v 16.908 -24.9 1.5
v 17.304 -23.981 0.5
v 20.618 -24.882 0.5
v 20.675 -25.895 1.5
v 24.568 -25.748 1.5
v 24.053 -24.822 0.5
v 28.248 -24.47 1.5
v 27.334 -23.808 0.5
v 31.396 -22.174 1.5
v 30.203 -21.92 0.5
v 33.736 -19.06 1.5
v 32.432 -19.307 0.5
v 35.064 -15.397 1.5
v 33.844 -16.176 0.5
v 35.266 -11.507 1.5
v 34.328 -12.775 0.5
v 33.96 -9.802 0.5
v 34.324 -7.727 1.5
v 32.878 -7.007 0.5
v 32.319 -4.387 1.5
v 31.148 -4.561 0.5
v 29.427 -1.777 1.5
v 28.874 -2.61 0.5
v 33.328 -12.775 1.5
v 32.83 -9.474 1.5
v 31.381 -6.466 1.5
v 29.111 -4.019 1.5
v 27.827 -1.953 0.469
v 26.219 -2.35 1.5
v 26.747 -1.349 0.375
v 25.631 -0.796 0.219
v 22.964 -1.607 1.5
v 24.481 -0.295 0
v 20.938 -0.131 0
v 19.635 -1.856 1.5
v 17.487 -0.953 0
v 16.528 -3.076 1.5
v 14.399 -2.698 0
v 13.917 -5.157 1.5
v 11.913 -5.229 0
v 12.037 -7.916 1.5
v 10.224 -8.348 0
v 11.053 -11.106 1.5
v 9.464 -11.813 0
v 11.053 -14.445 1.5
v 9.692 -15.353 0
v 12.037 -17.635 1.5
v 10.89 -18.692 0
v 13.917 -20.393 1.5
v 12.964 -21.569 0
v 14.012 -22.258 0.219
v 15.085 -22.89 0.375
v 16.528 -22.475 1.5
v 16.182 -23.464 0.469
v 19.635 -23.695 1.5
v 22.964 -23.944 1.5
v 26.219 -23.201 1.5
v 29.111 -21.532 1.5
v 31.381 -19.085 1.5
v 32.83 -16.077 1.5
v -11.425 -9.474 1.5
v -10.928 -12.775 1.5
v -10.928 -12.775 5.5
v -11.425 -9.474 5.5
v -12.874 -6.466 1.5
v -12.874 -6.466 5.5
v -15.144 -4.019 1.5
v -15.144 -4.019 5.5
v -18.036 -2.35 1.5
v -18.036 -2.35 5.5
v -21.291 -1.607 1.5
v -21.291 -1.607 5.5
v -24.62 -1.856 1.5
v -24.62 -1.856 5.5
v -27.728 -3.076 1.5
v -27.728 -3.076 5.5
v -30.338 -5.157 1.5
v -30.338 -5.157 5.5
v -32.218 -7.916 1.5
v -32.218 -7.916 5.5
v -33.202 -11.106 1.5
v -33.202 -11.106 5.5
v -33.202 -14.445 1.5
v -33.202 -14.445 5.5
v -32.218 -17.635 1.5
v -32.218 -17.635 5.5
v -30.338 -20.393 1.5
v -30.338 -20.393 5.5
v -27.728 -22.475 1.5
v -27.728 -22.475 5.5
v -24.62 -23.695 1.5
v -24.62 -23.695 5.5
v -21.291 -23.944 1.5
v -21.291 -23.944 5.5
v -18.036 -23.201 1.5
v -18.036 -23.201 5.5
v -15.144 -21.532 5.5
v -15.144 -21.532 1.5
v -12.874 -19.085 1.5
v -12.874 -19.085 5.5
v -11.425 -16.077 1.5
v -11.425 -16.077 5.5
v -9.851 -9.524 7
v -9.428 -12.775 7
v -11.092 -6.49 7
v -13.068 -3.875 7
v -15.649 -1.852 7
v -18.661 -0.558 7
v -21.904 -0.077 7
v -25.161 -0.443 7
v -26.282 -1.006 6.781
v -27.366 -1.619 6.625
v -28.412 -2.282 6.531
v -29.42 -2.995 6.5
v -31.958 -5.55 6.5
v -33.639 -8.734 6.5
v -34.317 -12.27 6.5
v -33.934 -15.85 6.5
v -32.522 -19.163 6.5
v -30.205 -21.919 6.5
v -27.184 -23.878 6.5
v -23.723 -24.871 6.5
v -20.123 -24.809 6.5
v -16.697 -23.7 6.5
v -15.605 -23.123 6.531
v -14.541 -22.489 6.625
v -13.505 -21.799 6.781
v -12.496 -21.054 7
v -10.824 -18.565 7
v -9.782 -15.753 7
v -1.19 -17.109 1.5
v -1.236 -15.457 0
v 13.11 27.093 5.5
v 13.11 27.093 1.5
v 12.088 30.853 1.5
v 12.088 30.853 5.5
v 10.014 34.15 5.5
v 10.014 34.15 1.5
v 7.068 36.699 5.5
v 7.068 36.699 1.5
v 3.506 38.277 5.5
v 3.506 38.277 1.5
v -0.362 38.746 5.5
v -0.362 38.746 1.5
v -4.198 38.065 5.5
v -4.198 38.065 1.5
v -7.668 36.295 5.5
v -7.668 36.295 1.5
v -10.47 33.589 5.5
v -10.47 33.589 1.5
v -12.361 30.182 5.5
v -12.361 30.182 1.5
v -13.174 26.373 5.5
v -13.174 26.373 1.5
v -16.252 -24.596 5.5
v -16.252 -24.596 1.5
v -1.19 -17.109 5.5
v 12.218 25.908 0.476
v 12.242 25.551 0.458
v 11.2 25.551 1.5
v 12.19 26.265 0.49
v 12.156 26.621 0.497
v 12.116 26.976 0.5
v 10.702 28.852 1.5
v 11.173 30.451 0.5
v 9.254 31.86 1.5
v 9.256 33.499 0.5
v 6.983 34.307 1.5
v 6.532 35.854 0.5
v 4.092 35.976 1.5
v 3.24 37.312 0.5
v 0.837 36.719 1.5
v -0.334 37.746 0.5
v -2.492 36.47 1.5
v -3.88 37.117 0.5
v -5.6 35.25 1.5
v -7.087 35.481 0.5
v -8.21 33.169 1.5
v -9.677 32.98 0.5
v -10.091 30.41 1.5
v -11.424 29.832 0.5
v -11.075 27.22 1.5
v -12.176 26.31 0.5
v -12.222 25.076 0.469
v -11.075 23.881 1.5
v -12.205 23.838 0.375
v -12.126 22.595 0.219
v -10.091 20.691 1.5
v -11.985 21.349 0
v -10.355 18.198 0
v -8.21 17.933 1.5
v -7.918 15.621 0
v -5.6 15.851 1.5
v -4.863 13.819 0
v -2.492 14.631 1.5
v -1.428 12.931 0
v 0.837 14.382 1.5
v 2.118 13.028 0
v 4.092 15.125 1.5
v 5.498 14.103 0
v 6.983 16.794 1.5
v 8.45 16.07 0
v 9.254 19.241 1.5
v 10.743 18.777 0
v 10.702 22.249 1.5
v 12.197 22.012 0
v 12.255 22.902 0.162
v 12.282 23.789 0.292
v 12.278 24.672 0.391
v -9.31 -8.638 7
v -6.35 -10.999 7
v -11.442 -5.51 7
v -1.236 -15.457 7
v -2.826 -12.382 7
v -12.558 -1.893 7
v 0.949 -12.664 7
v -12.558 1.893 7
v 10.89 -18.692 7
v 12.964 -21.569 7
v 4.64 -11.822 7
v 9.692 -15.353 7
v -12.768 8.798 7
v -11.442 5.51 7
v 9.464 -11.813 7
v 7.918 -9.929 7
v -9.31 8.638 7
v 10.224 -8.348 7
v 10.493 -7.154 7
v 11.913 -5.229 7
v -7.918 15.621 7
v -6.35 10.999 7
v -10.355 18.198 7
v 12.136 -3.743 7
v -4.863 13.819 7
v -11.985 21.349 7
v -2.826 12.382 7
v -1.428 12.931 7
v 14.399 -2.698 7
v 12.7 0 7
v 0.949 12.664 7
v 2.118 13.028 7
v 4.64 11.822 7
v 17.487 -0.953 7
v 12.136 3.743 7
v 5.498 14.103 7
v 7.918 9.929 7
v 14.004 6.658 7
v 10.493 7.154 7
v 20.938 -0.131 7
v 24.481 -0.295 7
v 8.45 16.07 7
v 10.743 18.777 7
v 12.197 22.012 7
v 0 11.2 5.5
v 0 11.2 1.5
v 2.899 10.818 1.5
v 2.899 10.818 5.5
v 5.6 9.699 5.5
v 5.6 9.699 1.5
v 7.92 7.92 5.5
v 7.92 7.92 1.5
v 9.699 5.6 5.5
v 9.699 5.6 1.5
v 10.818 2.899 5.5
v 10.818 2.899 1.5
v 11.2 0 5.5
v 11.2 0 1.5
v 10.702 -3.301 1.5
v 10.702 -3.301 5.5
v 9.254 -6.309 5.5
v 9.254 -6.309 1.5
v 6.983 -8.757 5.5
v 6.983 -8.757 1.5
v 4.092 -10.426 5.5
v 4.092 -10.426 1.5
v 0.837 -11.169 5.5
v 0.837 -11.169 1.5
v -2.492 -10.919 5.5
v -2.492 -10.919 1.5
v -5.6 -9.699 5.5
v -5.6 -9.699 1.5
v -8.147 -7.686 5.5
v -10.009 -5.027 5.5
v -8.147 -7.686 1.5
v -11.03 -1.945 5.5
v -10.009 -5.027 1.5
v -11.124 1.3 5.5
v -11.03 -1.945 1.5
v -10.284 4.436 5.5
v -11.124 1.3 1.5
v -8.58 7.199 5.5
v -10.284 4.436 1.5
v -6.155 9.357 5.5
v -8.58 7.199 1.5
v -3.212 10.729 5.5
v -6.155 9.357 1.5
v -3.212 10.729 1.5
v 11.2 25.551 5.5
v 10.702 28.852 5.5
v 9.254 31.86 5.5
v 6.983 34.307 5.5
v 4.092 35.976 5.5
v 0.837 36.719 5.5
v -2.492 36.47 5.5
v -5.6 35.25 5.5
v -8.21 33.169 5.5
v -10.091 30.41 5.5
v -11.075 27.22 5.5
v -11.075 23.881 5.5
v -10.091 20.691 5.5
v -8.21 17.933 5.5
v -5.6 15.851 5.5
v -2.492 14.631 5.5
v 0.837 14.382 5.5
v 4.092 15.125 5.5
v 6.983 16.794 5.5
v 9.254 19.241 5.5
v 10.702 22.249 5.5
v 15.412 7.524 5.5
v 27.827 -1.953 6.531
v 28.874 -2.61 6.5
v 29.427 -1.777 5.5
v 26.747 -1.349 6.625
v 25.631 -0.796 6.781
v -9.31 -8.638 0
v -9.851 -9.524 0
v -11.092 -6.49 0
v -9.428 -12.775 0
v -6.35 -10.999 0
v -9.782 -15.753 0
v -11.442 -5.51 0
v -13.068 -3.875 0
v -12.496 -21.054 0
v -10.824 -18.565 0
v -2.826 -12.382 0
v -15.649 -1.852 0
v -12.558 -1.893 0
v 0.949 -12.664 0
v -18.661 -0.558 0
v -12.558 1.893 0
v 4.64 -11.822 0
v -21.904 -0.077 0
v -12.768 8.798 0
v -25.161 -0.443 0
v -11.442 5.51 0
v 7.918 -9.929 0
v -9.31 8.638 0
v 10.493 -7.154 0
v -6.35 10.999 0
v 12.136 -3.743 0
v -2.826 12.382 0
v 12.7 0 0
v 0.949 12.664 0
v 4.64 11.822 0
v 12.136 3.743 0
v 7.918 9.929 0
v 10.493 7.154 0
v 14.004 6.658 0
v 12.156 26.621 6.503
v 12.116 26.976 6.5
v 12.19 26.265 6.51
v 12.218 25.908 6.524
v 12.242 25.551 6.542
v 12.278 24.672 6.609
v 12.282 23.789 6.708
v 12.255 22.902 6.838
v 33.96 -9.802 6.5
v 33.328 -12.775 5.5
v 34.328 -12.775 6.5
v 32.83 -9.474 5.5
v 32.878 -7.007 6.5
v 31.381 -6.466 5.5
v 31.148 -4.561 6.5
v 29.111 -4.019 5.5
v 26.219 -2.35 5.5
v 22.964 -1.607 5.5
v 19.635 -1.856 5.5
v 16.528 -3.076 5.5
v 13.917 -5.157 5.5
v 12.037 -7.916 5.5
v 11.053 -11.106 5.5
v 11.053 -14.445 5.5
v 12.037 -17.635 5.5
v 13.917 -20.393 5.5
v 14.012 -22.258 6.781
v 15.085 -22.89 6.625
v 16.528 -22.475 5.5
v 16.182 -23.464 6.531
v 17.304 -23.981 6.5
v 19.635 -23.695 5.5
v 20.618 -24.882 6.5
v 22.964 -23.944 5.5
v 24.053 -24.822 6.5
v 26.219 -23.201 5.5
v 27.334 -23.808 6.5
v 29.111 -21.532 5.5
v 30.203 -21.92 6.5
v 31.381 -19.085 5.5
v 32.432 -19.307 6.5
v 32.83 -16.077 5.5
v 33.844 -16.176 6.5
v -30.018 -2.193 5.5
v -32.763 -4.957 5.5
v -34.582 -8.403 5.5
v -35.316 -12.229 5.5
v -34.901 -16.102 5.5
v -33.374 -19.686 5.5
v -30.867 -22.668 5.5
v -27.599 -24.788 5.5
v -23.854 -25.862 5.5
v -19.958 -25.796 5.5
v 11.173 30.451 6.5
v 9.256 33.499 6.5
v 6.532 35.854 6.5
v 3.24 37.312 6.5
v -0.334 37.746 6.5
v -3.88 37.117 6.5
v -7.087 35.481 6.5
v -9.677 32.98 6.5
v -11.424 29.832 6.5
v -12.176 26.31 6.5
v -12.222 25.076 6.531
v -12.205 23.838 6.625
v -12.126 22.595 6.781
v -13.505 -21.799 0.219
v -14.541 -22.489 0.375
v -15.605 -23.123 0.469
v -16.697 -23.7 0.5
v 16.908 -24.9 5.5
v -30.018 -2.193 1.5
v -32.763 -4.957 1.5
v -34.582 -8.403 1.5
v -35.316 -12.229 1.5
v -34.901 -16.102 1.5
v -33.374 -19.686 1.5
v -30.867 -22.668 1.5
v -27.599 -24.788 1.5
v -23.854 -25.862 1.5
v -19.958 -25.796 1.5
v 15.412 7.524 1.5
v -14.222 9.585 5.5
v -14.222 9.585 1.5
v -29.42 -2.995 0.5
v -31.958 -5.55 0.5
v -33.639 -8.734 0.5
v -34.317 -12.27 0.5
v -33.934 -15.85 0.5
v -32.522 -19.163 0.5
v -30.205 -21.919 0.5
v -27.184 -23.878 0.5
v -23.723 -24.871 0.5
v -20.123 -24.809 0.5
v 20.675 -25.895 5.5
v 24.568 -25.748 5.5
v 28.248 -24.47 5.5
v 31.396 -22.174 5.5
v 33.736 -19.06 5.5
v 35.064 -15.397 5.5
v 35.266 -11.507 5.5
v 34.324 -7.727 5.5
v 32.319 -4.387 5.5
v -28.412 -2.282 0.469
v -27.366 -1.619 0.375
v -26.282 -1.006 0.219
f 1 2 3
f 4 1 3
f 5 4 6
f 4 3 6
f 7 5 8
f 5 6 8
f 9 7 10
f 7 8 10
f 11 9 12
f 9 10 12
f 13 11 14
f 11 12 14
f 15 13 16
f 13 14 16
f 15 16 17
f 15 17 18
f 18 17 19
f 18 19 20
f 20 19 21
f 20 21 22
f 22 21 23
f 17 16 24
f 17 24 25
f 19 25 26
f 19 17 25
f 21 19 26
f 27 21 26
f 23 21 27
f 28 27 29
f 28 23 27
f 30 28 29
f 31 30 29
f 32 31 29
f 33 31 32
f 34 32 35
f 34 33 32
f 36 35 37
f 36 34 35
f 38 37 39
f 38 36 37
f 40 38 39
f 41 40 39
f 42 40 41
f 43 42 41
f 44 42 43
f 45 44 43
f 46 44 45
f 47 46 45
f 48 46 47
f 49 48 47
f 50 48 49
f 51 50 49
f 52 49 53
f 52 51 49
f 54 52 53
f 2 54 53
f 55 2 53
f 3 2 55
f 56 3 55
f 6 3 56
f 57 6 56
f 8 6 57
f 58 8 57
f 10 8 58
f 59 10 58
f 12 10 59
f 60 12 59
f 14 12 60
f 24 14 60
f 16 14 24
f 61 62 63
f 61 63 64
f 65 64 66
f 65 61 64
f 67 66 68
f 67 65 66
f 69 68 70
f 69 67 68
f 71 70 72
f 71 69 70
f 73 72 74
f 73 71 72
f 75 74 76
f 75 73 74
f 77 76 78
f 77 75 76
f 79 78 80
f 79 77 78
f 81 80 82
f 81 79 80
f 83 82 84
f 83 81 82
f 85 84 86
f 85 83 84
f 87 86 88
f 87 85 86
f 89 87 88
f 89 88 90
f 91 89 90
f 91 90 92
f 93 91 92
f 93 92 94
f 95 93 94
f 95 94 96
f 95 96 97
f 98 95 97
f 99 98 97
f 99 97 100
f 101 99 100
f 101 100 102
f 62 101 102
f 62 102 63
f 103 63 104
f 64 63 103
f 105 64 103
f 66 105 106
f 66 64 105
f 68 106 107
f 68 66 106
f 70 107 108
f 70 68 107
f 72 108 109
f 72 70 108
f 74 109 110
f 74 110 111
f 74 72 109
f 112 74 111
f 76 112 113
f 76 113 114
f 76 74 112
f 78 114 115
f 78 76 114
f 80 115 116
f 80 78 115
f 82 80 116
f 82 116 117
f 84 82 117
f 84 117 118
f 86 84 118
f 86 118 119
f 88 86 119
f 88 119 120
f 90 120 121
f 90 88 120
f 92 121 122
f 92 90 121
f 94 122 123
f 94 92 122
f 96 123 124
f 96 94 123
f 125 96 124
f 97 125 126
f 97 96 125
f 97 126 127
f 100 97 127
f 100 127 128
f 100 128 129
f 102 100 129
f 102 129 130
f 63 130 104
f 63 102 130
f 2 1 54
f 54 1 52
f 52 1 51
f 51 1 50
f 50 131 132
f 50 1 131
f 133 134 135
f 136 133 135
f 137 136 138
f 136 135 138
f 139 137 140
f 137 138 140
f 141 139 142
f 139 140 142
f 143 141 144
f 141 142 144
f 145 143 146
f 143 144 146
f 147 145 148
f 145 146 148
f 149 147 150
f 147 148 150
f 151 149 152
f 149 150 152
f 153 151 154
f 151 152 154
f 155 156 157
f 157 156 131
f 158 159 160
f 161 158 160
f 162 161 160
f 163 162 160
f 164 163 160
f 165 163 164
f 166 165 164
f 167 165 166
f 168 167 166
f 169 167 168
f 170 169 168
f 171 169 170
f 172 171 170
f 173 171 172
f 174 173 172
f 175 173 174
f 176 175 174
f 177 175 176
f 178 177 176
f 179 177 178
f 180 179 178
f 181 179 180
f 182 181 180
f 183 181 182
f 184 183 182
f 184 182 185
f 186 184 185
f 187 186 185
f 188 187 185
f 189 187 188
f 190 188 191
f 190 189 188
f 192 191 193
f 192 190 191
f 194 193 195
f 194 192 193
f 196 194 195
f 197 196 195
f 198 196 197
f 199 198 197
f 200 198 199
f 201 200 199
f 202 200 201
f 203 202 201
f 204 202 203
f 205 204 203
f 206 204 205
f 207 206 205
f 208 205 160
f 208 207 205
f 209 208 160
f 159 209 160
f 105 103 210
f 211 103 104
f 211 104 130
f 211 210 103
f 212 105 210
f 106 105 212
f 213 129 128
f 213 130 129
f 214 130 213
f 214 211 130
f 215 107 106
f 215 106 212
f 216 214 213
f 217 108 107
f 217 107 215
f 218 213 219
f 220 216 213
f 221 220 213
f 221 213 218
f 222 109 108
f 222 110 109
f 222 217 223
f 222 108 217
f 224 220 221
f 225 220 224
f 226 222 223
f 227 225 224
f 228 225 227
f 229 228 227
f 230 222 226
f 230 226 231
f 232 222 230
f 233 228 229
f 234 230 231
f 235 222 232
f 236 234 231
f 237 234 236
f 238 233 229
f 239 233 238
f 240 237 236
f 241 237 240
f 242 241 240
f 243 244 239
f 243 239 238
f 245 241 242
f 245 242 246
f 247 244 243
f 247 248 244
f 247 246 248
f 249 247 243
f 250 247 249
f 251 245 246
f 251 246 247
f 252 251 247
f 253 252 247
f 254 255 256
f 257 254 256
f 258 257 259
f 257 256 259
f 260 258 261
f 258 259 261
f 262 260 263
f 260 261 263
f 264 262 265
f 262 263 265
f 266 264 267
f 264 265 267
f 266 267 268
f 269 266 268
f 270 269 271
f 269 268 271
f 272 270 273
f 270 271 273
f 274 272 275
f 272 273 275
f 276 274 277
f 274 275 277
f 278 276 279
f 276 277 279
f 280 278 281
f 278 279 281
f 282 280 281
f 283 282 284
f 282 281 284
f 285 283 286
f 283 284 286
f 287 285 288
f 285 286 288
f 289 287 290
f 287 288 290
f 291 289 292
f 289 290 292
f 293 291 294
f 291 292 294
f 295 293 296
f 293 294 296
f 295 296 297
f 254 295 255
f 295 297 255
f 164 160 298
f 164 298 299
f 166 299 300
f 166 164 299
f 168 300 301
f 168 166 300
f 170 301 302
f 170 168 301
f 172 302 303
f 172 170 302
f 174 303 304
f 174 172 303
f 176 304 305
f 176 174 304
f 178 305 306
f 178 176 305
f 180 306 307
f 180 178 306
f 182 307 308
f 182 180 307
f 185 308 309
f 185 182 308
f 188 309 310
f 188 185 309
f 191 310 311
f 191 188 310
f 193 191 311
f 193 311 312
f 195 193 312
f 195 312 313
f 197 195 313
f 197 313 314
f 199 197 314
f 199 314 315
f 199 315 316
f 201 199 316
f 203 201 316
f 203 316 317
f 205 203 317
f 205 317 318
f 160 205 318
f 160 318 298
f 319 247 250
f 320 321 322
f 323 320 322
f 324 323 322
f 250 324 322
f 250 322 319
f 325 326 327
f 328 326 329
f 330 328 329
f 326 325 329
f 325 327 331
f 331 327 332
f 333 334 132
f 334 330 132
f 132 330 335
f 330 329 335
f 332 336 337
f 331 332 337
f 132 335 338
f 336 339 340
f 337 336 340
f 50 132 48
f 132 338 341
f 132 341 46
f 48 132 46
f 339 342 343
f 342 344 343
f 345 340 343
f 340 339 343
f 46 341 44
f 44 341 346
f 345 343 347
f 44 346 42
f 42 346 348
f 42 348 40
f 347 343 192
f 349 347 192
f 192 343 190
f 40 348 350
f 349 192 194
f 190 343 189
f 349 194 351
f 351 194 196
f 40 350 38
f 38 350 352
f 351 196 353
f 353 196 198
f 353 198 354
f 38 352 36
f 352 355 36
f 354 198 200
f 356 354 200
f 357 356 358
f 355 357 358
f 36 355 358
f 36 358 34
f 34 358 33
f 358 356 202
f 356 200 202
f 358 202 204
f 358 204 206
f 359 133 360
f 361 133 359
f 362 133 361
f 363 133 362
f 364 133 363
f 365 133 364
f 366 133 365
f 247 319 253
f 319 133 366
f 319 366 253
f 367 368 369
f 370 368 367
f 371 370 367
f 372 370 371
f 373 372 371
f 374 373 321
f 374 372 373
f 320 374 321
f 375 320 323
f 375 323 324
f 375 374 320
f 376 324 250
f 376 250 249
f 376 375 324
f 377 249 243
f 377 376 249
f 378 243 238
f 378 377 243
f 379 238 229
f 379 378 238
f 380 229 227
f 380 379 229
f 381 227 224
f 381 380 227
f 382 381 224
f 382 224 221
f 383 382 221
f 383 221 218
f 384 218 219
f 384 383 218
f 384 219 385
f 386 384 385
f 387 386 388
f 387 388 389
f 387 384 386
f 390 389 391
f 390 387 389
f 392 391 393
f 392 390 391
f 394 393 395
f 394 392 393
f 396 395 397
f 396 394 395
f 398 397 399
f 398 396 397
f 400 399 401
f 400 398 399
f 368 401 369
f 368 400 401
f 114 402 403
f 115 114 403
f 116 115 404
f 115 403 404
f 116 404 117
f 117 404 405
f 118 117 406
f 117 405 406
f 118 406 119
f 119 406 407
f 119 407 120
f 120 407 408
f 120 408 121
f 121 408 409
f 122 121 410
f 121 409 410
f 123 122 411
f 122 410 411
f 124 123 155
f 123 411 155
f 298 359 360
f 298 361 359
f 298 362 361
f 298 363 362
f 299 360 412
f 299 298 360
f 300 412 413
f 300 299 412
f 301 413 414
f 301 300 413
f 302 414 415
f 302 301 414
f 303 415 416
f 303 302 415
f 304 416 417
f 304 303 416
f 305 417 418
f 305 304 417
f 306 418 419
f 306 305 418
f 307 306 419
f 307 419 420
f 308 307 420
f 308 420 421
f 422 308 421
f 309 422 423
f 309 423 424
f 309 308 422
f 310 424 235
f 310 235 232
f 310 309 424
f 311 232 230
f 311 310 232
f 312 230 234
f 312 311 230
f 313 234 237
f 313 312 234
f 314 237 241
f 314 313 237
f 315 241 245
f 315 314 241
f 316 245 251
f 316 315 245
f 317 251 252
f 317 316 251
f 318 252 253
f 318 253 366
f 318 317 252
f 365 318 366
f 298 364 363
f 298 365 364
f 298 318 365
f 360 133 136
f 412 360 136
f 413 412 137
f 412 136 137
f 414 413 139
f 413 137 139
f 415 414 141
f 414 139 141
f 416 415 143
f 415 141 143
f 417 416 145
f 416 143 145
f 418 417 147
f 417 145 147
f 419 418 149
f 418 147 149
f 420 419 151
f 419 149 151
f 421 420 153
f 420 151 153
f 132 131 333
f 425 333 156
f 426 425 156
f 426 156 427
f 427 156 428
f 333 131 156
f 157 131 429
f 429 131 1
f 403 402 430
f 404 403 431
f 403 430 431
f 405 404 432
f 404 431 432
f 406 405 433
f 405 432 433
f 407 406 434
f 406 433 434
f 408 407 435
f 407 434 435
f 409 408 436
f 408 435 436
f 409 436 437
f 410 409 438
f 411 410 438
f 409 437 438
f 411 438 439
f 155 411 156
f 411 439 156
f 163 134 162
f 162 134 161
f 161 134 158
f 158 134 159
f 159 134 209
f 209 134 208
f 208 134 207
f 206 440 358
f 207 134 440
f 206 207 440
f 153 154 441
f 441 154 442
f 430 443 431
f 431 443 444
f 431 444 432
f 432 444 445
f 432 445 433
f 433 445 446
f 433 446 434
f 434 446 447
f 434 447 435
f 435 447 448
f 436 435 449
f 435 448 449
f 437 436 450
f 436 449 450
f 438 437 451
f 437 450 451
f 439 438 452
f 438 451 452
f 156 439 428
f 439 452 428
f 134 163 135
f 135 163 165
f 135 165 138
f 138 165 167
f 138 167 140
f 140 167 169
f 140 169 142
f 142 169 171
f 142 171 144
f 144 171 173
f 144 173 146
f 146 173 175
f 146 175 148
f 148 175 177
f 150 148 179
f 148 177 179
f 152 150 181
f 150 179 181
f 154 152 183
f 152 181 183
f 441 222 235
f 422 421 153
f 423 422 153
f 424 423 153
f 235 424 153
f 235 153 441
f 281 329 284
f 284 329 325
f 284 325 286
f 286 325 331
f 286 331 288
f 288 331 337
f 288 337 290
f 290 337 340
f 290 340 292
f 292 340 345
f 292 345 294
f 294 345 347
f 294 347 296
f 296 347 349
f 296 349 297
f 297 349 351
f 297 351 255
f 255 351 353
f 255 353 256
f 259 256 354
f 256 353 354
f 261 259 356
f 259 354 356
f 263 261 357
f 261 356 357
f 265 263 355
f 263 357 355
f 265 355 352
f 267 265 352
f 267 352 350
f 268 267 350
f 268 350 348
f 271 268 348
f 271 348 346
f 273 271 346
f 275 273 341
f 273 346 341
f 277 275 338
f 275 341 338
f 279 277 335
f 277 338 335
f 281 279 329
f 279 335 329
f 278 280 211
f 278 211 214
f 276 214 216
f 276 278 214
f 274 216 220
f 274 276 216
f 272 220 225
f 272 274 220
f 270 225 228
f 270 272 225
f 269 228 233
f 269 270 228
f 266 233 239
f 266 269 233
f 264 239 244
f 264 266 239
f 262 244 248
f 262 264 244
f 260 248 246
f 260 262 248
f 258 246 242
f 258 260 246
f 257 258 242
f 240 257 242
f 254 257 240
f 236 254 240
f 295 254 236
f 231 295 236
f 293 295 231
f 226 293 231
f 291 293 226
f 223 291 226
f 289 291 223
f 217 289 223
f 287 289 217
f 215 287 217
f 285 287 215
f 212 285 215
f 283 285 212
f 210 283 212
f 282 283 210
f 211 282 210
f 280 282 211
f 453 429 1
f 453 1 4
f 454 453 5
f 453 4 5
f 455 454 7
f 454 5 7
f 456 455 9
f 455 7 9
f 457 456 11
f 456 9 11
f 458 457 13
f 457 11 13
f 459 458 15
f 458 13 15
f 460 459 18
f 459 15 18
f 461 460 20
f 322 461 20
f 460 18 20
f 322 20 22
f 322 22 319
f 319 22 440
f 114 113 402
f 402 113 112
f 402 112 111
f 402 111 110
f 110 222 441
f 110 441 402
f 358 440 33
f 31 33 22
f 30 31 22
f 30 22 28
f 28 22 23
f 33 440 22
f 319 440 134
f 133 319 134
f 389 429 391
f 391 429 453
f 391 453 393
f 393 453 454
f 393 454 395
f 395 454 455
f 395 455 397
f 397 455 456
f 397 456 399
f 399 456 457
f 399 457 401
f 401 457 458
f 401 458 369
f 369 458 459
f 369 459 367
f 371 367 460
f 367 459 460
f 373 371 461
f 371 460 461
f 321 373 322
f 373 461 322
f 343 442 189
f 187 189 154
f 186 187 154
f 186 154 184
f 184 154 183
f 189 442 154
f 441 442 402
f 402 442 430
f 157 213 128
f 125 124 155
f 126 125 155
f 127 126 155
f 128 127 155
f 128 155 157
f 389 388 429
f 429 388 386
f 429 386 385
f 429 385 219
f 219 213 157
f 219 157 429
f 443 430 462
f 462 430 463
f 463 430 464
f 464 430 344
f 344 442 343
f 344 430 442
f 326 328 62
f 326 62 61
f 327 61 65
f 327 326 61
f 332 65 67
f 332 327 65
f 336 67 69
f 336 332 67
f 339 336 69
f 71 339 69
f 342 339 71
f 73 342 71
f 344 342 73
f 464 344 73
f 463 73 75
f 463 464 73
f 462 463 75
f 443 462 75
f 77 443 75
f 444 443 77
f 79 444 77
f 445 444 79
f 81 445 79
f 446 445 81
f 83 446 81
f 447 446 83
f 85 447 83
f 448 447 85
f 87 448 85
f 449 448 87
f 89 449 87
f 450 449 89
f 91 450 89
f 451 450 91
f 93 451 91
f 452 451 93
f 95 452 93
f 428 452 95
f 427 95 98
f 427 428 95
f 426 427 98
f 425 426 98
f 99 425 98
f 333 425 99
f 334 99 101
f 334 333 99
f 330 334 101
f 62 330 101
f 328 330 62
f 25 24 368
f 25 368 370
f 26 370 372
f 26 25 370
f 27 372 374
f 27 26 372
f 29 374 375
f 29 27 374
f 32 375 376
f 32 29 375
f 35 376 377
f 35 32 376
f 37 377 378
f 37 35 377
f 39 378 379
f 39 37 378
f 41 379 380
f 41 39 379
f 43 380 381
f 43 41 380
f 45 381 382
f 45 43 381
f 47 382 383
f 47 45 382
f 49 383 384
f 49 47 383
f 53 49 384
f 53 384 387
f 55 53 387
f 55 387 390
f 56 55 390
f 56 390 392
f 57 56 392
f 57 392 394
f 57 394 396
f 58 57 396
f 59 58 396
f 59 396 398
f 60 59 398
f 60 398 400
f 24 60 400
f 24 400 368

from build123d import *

# Parameters (mm, degrees)
F0_R         = 11.2
F1_DEPTH     = 7
F2_T4_DEPTH  = 23.5617897445
F2_T7_ANGLE  = 169.7193644143
F2_T11_DEPTH = 20.6774904565
F2_T16_DEPTH = 23.5617897445
F2_T19_ANGLE = 169.7193644143
F2_T23_DEPTH = 20.6774904565
F2_T28_DEPTH = 23.5617897445
F2_T31_ANGLE = 169.7193644143
F2_T35_DEPTH = 20.6774904565
F2_T49_DEPTH = 23.5617897445
F2_T53_DEPTH = 20.6774904565
F2_T60_DEPTH = 20.6774904565
F2_T64_DEPTH = 23.5617897445
F2_T71_DEPTH = 20.6774904565
F2_T75_DEPTH = 23.5617897445
F3_T4_DEPTH  = 23.5617897445
F3_T7_ANGLE  = 169.7193644143
F3_T11_DEPTH = 20.6774904565
F3_T16_DEPTH = 23.5617897445
F3_T19_ANGLE = 169.7193644143
F3_T23_DEPTH = 20.6774904565
F3_T28_DEPTH = 23.5617897445
F3_T31_ANGLE = 169.7193644143
F3_T35_DEPTH = 20.6774904565
F3_T49_DEPTH = 23.5617897445
F3_T53_DEPTH = 20.6774904565
F3_T60_DEPTH = 23.5617897445
F3_T64_DEPTH = 20.6774904565
F3_T71_DEPTH = 23.5617897445
F3_T75_DEPTH = 20.6774904565


# Not quite as in the source:
# - a fillet or chamfer that OpenCascade refuses, or shapes differently, is made with other operations: its cross-section is extruded or revolved along the edge and cut away or added


with BuildPart() as f1:
    # F0 (on Top) → F1 (new body)
    with BuildSketch(Plane.XY):
        with BuildLine():
            Line((15.4120276741, 7.5237850523), (13.109573538, 27.0930664517))
            ThreePointArc((13.109573538, 27.0930664517), (-0.3616695295, 38.7456835975), (-13.1743812219, 26.3726364702))
            Line((-13.1743812219, 26.3726364702), (-14.221802825, 9.5853149634))
            Line((-14.221802825, 9.5853149634), (-30.0180705826, -2.1933095092))
            ThreePointArc((-30.0180705826, -2.1933095092), (-33.3739115177, -19.686056799), (-16.252182537, -24.5956670524))
            Line((-16.252182537, -24.5956670524), (-1.1902248491, -17.1091000158))
            Line((-1.1902248491, -17.1091000158), (16.9084970446, -24.8997569426))
            ThreePointArc((16.9084970446, -24.8997569426), (33.7355810471, -19.0596267984), (29.4265637589, -1.7769694177))
            Line((29.4265637589, -1.7769694177), (15.4120276741, 7.5237850523))
        make_face()
        with Locations((-22.1275026794, -12.7753196284)):
            Circle(F0_R, mode=Mode.SUBTRACT)
        with Locations((22.1275026794, -12.7753196284)):
            Circle(F0_R, mode=Mode.SUBTRACT)
        with BuildLine():
            ThreePointArc((0, 11.2), (7.9195959493, 7.9195959493), (11.2, 0))
            ThreePointArc((11.2, 0), (5.6, -9.6994845224), (-5.6, -9.6994845224))
            ThreePointArc((-5.6, -9.6994845224), (-10.8183692544, 2.8987733051), (0, 11.2))
        make_face(mode=Mode.SUBTRACT)
        with Locations((0, 25.5506392568)):
            Circle(F0_R, mode=Mode.SUBTRACT)
    extrude(amount=F1_DEPTH)

    # F2: chamfer of 1.5 on 13 edges, made by hand


with BuildPart() as f2_tool2:
    # F2_s3 → F2_t4 (new body)
    with BuildSketch(Plane(origin=(-0.211945286, 1.8013896037, 0), x_dir=(0, 0, 1), z_dir=(-0.1168505451, 0.9931495105, 0))):
        Polygon((5.5, 16.185606124), (7, 14.685606124), (7, 16.185606124), align=None)
    extrude(amount=F2_T4_DEPTH)

    split(bisect_by=Plane(origin=(8.1788758548, 12.3240701783, 0), x_dir=(0, 0, 1), z_dir=(0.5529591727, 0.8332083493, 0)), keep=Keep.TOP)


with BuildPart() as f1_1:
    add(f1.part)

    # F2_t1: cut F2_tool2
    add(f2_tool2.part, mode=Mode.SUBTRACT)

    # F2_s6 → F2_t7 (revolve, cut)
    with BuildSketch(Plane(origin=(-2.9651532605, 25.2017695539, 0), x_dir=(0, 0, 1), z_dir=(0.1168505451, -0.9931495105, 0))):
        Polygon((7, -14.685606124), (5.5, -16.185606124), (7, -16.185606124), align=None)
    revolve(axis=Axis((0, 25.5506392568, 7), (0, 0, 1)), revolution_arc=F2_T7_ANGLE, mode=Mode.SUBTRACT)


with BuildPart() as f2_tool9:
    # F2_s10 → F2_t11 (new body)
    with BuildSketch(Plane(origin=(1.5880145579, 25.4515572947, 0), x_dir=(0, 0, 1), z_dir=(-0.0622725162, -0.9980591835, 0))):
        Polygon((7, 13.2911025961), (5.5, 14.7911025961), (7, 14.7911025961), align=None)
    extrude(amount=F2_T11_DEPTH)

    split(bisect_by=Plane(origin=(-9.6752745589, 12.9754733174, 0), x_dir=(0, 0, 1), z_dir=(-0.5977702957, 0.8016674333, 0)), keep=Keep.TOP)


with BuildPart() as f1_2:
    add(f1_1.part)

    # F2_t8: cut F2_tool9
    add(f2_tool9.part, mode=Mode.SUBTRACT)


with BuildPart() as f2_tool14:
    # F2_s15 → F2_t16 (new body)
    with BuildSketch(Plane(origin=(-1.4540765159, -1.0842448037, 0), x_dir=(0, 0, 1), z_dir=(-0.8016674333, -0.5977702957, 0))):
        Polygon((7, 14.685606124), (5.5, 16.185606124), (7, 16.185606124), align=None)
    extrude(amount=F2_T16_DEPTH)

    split(bisect_by=Plane(origin=(-14.7623957799, 0.9210791755, 0), x_dir=(0, 0, 1), z_dir=(-0.9980591835, 0.0622725162, 0)), keep=Keep.TOP)


with BuildPart() as f1_3:
    add(f1_2.part)

    # F2_t13: cut F2_tool14
    add(f2_tool14.part, mode=Mode.SUBTRACT)

    # F2_s18 → F2_t19 (revolve, cut)
    with BuildSketch(Plane(origin=(-20.3427960238, -15.1687828266, 0), x_dir=(0, 0, 1), z_dir=(0.8016674333, 0.5977702957, 0))):
        Polygon((7, -14.685606124), (5.5, -16.185606124), (7, -16.185606124), align=None)
    revolve(axis=Axis((-22.1275026794, -12.7753196284, 7), (0, 0, 1)), revolution_arc=F2_T19_ANGLE, mode=Mode.SUBTRACT)


with BuildPart() as f2_tool21:
    # F2_s22 → F2_t23 (new body)
    with BuildSketch(Plane(origin=(-22.835702462, -11.3505176986, 0), x_dir=(0, 0, 1), z_dir=(0.8954808655, 0.4451000108, 0))):
        Polygon((7, 13.2911025961), (5.5, 14.7911025961), (7, 14.7911025961), align=None)
    extrude(amount=F2_T23_DEPTH)

    split(bisect_by=Plane(origin=(-6.3994522396, -14.8667702153, 0), x_dir=(0, 0, 1), z_dir=(-0.3953792148, -0.9185179783, 0)), keep=Keep.TOP)


with BuildPart() as f1_4:
    add(f1_3.part)

    # F2_t20: cut F2_tool21
    add(f2_tool21.part, mode=Mode.SUBTRACT)


with BuildPart() as f2_tool26:
    # F2_s27 → F2_t28 (new body)
    with BuildSketch(Plane(origin=(1.6660218019, -0.7171447999, 0), x_dir=(0, 0, 1), z_dir=(0.9185179783, -0.3953792148, 0))):
        Polygon((7, 14.685606124), (5.5, 16.185606124), (7, 16.185606124), align=None)
    extrude(amount=F2_T28_DEPTH)

    split(bisect_by=Plane(origin=(6.5835199251, -13.2451493538, 0), x_dir=(0, 0, 1), z_dir=(0.4451000108, -0.8954808655, 0)), keep=Keep.TOP)


with BuildPart() as f1_5:
    add(f1_4.part)

    # F2_t25: cut F2_tool26
    add(f2_tool26.part, mode=Mode.SUBTRACT)

    # F2_s30 → F2_t31 (revolve, cut)
    with BuildSketch(Plane(origin=(23.3079492842, -10.0329867273, 0), x_dir=(0, 0, 1), z_dir=(-0.9185179783, 0.3953792148, 0))):
        Polygon((7, -14.685606124), (5.5, -16.185606124), (7, -16.185606124), align=None)
    revolve(axis=Axis((22.1275026794, -12.7753196284, 7), (0, 0, 1)), revolution_arc=F2_T31_ANGLE, mode=Mode.SUBTRACT)


with BuildPart() as f2_tool33:
    # F2_s34 → F2_t35 (new body)
    with BuildSketch(Plane(origin=(21.2476879041, -14.1010395961, 0), x_dir=(0, 0, 1), z_dir=(-0.8332083493, 0.5529591727, 0))):
        Polygon((7, 13.2911025961), (5.5, 14.7911025961), (7, 14.7911025961), align=None)
    extrude(amount=F2_T35_DEPTH)

    split(bisect_by=Plane(origin=(16.0747267985, 1.8912968978, 0), x_dir=(0, 0, 1), z_dir=(0.9931495105, 0.1168505451, 0)), keep=Keep.TOP)


with BuildPart() as f1_6:
    add(f1_5.part)

    # F2_t32: cut F2_tool33
    add(f2_tool33.part, mode=Mode.SUBTRACT)

    # F2_s37 → F2_t38 (revolve, cut)
    with BuildSketch(Plane.XZ.offset(12.7753196284)):
        Polygon((-9.4275026794, 7), (-10.9275026794, 5.5), (-10.9275026794, 7), align=None)
    revolve(axis=Axis((-22.1275026794, -12.7753196284, 7), (0, 0, 1)), mode=Mode.SUBTRACT)

    # F2_s39 → F2_t40 (revolve, cut)
    with BuildSketch(Plane.XZ.offset(12.7753196284)):
        Polygon((34.8275026794, 7), (33.3275026794, 5.5), (33.3275026794, 7), align=None)
    revolve(axis=Axis((22.1275026794, -12.7753196284, 7), (0, 0, 1)), mode=Mode.SUBTRACT)

    # F2_s41 → F2_t42 (revolve, cut)
    with BuildSketch(Plane(origin=(0, 0, 0), x_dir=(0, 0, 1), z_dir=(-0.8660254038, 0.5, 0))):
        Polygon((7, -12.7), (5.5, -11.2), (7, -11.2), align=None)
    revolve(axis=Axis((0, 0, 7), (0, 0, 1)), mode=Mode.SUBTRACT)

    # F2_s43 → F2_t44 (revolve, cut)
    with BuildSketch(Plane.XZ.offset(-25.5506392568)):
        Polygon((12.7, 7), (11.2, 5.5), (11.2, 7), align=None)
    revolve(axis=Axis((0, 25.5506392568, 7), (0, 0, 1)), mode=Mode.SUBTRACT)


with BuildPart() as f2_tool47:
    # F2_s48 → F2_t49 (new body)
    with BuildSketch(Plane(origin=(-0.211945286, 1.8013896037, 0), x_dir=(0, 0, 1), z_dir=(-0.1168505451, 0.9931495105, 0))):
        Polygon((5.5, 16.185606124), (7, 14.685606124), (7, 16.185606124), align=None)
    extrude(amount=F2_T49_DEPTH)

    split(bisect_by=Plane(origin=(8.1788758548, 12.3240701783, 0), x_dir=(0, 0, 1), z_dir=(-0.5529591727, -0.8332083493, 0)), keep=Keep.TOP)


with BuildPart() as f2_tool51:
    # F2_s52 → F2_t53 (new body)
    with BuildSketch(Plane(origin=(21.2476879041, -14.1010395961, 0), x_dir=(0, 0, 1), z_dir=(-0.8332083493, 0.5529591727, 0))):
        Polygon((7, 13.2911025961), (5.5, 14.7911025961), (7, 14.7911025961), align=None)
    extrude(amount=F2_T53_DEPTH)

    split(bisect_by=Plane(origin=(16.0747267985, 1.8912968978, 0), x_dir=(0, 0, 1), z_dir=(-0.9931495105, -0.1168505451, 0)), keep=Keep.TOP)


with BuildPart() as f2_tool47_1:
    add(f2_tool47.part)

    # F2_t55: intersect F2_tool51
    add(f2_tool51.part, mode=Mode.INTERSECT)


with BuildPart() as f1_7:
    add(f1_6.part)

    # F2_t45: cut F2_tool47
    add(f2_tool47_1.part, mode=Mode.SUBTRACT)


with BuildPart() as f2_tool58:
    # F2_s59 → F2_t60 (new body)
    with BuildSketch(Plane(origin=(1.5880145579, 25.4515572947, 0), x_dir=(0, 0, 1), z_dir=(-0.0622725162, -0.9980591835, 0))):
        Polygon((7, 13.2911025961), (5.5, 14.7911025961), (7, 14.7911025961), align=None)
    extrude(amount=F2_T60_DEPTH)

    split(bisect_by=Plane(origin=(-9.6752745589, 12.9754733174, 0), x_dir=(0, 0, 1), z_dir=(0.5977702957, -0.8016674333, 0)), keep=Keep.TOP)


with BuildPart() as f2_tool62:
    # F2_s63 → F2_t64 (new body)
    with BuildSketch(Plane(origin=(-1.4540765159, -1.0842448037, 0), x_dir=(0, 0, 1), z_dir=(-0.8016674333, -0.5977702957, 0))):
        Polygon((7, 14.685606124), (5.5, 16.185606124), (7, 16.185606124), align=None)
    extrude(amount=F2_T64_DEPTH)

    split(bisect_by=Plane(origin=(-14.7623957799, 0.9210791755, 0), x_dir=(0, 0, 1), z_dir=(0.9980591835, -0.0622725162, 0)), keep=Keep.TOP)


with BuildPart() as f2_tool58_1:
    add(f2_tool58.part)

    # F2_t66: intersect F2_tool62
    add(f2_tool62.part, mode=Mode.INTERSECT)


with BuildPart() as f1_8:
    add(f1_7.part)

    # F2_t56: cut F2_tool58
    add(f2_tool58_1.part, mode=Mode.SUBTRACT)


with BuildPart() as f2_tool69:
    # F2_s70 → F2_t71 (new body)
    with BuildSketch(Plane(origin=(-22.835702462, -11.3505176986, 0), x_dir=(0, 0, 1), z_dir=(0.8954808655, 0.4451000108, 0))):
        Polygon((7, 13.2911025961), (5.5, 14.7911025961), (7, 14.7911025961), align=None)
    extrude(amount=F2_T71_DEPTH)

    split(bisect_by=Plane(origin=(-6.3994522396, -14.8667702153, 0), x_dir=(0, 0, 1), z_dir=(0.3953792148, 0.9185179783, 0)), keep=Keep.TOP)


with BuildPart() as f2_tool73:
    # F2_s74 → F2_t75 (new body)
    with BuildSketch(Plane(origin=(1.6660218019, -0.7171447999, 0), x_dir=(0, 0, 1), z_dir=(0.9185179783, -0.3953792148, 0))):
        Polygon((7, 14.685606124), (5.5, 16.185606124), (7, 16.185606124), align=None)
    extrude(amount=F2_T75_DEPTH)

    split(bisect_by=Plane(origin=(6.5835199251, -13.2451493538, 0), x_dir=(0, 0, 1), z_dir=(-0.4451000108, 0.8954808655, 0)), keep=Keep.TOP)


with BuildPart() as f2_tool69_1:
    add(f2_tool69.part)

    # F2_t77: intersect F2_tool73
    add(f2_tool73.part, mode=Mode.INTERSECT)


with BuildPart() as f1_9:
    add(f1_8.part)

    # F2_t67: cut F2_tool69
    add(f2_tool69_1.part, mode=Mode.SUBTRACT)

    # F3: chamfer of 1.5 on 13 edges, made by hand


with BuildPart() as f3_tool2:
    # F3_s3 → F3_t4 (new body)
    with BuildSketch(Plane(origin=(-0.211945286, 1.8013896037, 0), x_dir=(0, 0, 1), z_dir=(-0.1168505451, 0.9931495105, 0))):
        Polygon((1.5, 16.185606124), (0, 14.685606124), (0, 16.185606124), align=None)
    extrude(amount=F3_T4_DEPTH)

    split(bisect_by=Plane(origin=(8.1788758548, 12.3240701783, 0), x_dir=(0, 0, 1), z_dir=(0.5529591727, 0.8332083493, 0)), keep=Keep.TOP)


with BuildPart() as f1_10:
    add(f1_9.part)

    # F3_t1: cut F3_tool2
    add(f3_tool2.part, mode=Mode.SUBTRACT)

    # F3_s6 → F3_t7 (revolve, cut)
    with BuildSketch(Plane(origin=(-2.9651532605, 25.2017695539, 0), x_dir=(0, 0, 1), z_dir=(0.1168505451, -0.9931495105, 0))):
        Polygon((1.5, -16.185606124), (0, -14.685606124), (0, -16.185606124), align=None)
    revolve(axis=Axis((0, 25.5506392568, 0), (0, 0, 1)), revolution_arc=F3_T7_ANGLE, mode=Mode.SUBTRACT)


with BuildPart() as f3_tool9:
    # F3_s10 → F3_t11 (new body)
    with BuildSketch(Plane(origin=(1.5880145579, 25.4515572947, 0), x_dir=(0, 0, 1), z_dir=(-0.0622725162, -0.9980591835, 0))):
        Polygon((1.5, 14.7911025961), (0, 13.2911025961), (0, 14.7911025961), align=None)
    extrude(amount=F3_T11_DEPTH)

    split(bisect_by=Plane(origin=(-9.6752745589, 12.9754733174, 0), x_dir=(0, 0, 1), z_dir=(-0.5977702957, 0.8016674333, 0)), keep=Keep.TOP)


with BuildPart() as f1_11:
    add(f1_10.part)

    # F3_t8: cut F3_tool9
    add(f3_tool9.part, mode=Mode.SUBTRACT)


with BuildPart() as f3_tool14:
    # F3_s15 → F3_t16 (new body)
    with BuildSketch(Plane(origin=(-1.4540765159, -1.0842448037, 0), x_dir=(0, 0, 1), z_dir=(-0.8016674333, -0.5977702957, 0))):
        Polygon((1.5, 16.185606124), (0, 14.685606124), (0, 16.185606124), align=None)
    extrude(amount=F3_T16_DEPTH)

    split(bisect_by=Plane(origin=(-14.7623957799, 0.9210791755, 0), x_dir=(0, 0, 1), z_dir=(-0.9980591835, 0.0622725162, 0)), keep=Keep.TOP)


with BuildPart() as f1_12:
    add(f1_11.part)

    # F3_t13: cut F3_tool14
    add(f3_tool14.part, mode=Mode.SUBTRACT)

    # F3_s18 → F3_t19 (revolve, cut)
    with BuildSketch(Plane(origin=(-20.3427960238, -15.1687828266, 0), x_dir=(0, 0, 1), z_dir=(0.8016674333, 0.5977702957, 0))):
        Polygon((1.5, -16.185606124), (0, -14.685606124), (0, -16.185606124), align=None)
    revolve(axis=Axis((-22.1275026794, -12.7753196284, 0), (0, 0, 1)), revolution_arc=F3_T19_ANGLE, mode=Mode.SUBTRACT)


with BuildPart() as f3_tool21:
    # F3_s22 → F3_t23 (new body)
    with BuildSketch(Plane(origin=(-22.835702462, -11.3505176986, 0), x_dir=(0, 0, 1), z_dir=(0.8954808655, 0.4451000108, 0))):
        Polygon((1.5, 14.7911025961), (0, 13.2911025961), (0, 14.7911025961), align=None)
    extrude(amount=F3_T23_DEPTH)

    split(bisect_by=Plane(origin=(-6.3994522396, -14.8667702153, 0), x_dir=(0, 0, 1), z_dir=(-0.3953792148, -0.9185179783, 0)), keep=Keep.TOP)


with BuildPart() as f1_13:
    add(f1_12.part)

    # F3_t20: cut F3_tool21
    add(f3_tool21.part, mode=Mode.SUBTRACT)


with BuildPart() as f3_tool26:
    # F3_s27 → F3_t28 (new body)
    with BuildSketch(Plane(origin=(1.6660218019, -0.7171447999, 0), x_dir=(0, 0, 1), z_dir=(0.9185179783, -0.3953792148, 0))):
        Polygon((1.5, 16.185606124), (0, 14.685606124), (0, 16.185606124), align=None)
    extrude(amount=F3_T28_DEPTH)

    split(bisect_by=Plane(origin=(6.5835199251, -13.2451493538, 0), x_dir=(0, 0, 1), z_dir=(0.4451000108, -0.8954808655, 0)), keep=Keep.TOP)


with BuildPart() as f1_14:
    add(f1_13.part)

    # F3_t25: cut F3_tool26
    add(f3_tool26.part, mode=Mode.SUBTRACT)

    # F3_s30 → F3_t31 (revolve, cut)
    with BuildSketch(Plane(origin=(23.3079492842, -10.0329867273, 0), x_dir=(0, 0, 1), z_dir=(-0.9185179783, 0.3953792148, 0))):
        Polygon((1.5, -16.185606124), (0, -14.685606124), (0, -16.185606124), align=None)
    revolve(axis=Axis((22.1275026794, -12.7753196284, 0), (0, 0, 1)), revolution_arc=F3_T31_ANGLE, mode=Mode.SUBTRACT)


with BuildPart() as f3_tool33:
    # F3_s34 → F3_t35 (new body)
    with BuildSketch(Plane(origin=(21.2476879041, -14.1010395961, 0), x_dir=(0, 0, 1), z_dir=(-0.8332083493, 0.5529591727, 0))):
        Polygon((1.5, 14.7911025961), (0, 13.2911025961), (0, 14.7911025961), align=None)
    extrude(amount=F3_T35_DEPTH)

    split(bisect_by=Plane(origin=(16.0747267985, 1.8912968978, 0), x_dir=(0, 0, 1), z_dir=(0.9931495105, 0.1168505451, 0)), keep=Keep.TOP)


with BuildPart() as f1_15:
    add(f1_14.part)

    # F3_t32: cut F3_tool33
    add(f3_tool33.part, mode=Mode.SUBTRACT)

    # F3_s37 → F3_t38 (revolve, cut)
    with BuildSketch(Plane.XZ.offset(12.7753196284)):
        Polygon((-10.9275026794, 1.5), (-9.4275026794, 0), (-10.9275026794, 0), align=None)
    revolve(axis=Axis((-22.1275026794, -12.7753196284, 0), (0, 0, 1)), mode=Mode.SUBTRACT)

    # F3_s39 → F3_t40 (revolve, cut)
    with BuildSketch(Plane.XZ.offset(12.7753196284)):
        Polygon((33.3275026794, 1.5), (34.8275026794, 0), (33.3275026794, 0), align=None)
    revolve(axis=Axis((22.1275026794, -12.7753196284, 0), (0, 0, 1)), mode=Mode.SUBTRACT)

    # F3_s41 → F3_t42 (revolve, cut)
    with BuildSketch(Plane(origin=(0, 0, 0), x_dir=(0, 0, 1), z_dir=(0.8660254038, -0.5, 0))):
        Polygon((1.5, 11.2), (0, 12.7), (0, 11.2), align=None)
    revolve(axis=Axis((0, 0, 0), (0, 0, -1)), mode=Mode.SUBTRACT)

    # F3_s43 → F3_t44 (revolve, cut)
    with BuildSketch(Plane.XZ.offset(-25.5506392568)):
        Polygon((11.2, 1.5), (12.7, 0), (11.2, 0), align=None)
    revolve(axis=Axis((0, 25.5506392568, 0), (0, 0, 1)), mode=Mode.SUBTRACT)


with BuildPart() as f3_tool47:
    # F3_s48 → F3_t49 (new body)
    with BuildSketch(Plane(origin=(-0.211945286, 1.8013896037, 0), x_dir=(0, 0, 1), z_dir=(-0.1168505451, 0.9931495105, 0))):
        Polygon((1.5, 16.185606124), (0, 14.685606124), (0, 16.185606124), align=None)
    extrude(amount=F3_T49_DEPTH)

    split(bisect_by=Plane(origin=(8.1788758548, 12.3240701783, 0), x_dir=(0, 0, 1), z_dir=(-0.5529591727, -0.8332083493, 0)), keep=Keep.TOP)


with BuildPart() as f3_tool51:
    # F3_s52 → F3_t53 (new body)
    with BuildSketch(Plane(origin=(21.2476879041, -14.1010395961, 0), x_dir=(0, 0, 1), z_dir=(-0.8332083493, 0.5529591727, 0))):
        Polygon((1.5, 14.7911025961), (0, 13.2911025961), (0, 14.7911025961), align=None)
    extrude(amount=F3_T53_DEPTH)

    split(bisect_by=Plane(origin=(16.0747267985, 1.8912968978, 0), x_dir=(0, 0, 1), z_dir=(-0.9931495105, -0.1168505451, 0)), keep=Keep.TOP)


with BuildPart() as f3_tool47_1:
    add(f3_tool47.part)

    # F3_t55: intersect F3_tool51
    add(f3_tool51.part, mode=Mode.INTERSECT)


with BuildPart() as f1_16:
    add(f1_15.part)

    # F3_t45: cut F3_tool47
    add(f3_tool47_1.part, mode=Mode.SUBTRACT)


with BuildPart() as f3_tool58:
    # F3_s59 → F3_t60 (new body)
    with BuildSketch(Plane(origin=(-1.4540765159, -1.0842448037, 0), x_dir=(0, 0, 1), z_dir=(-0.8016674333, -0.5977702957, 0))):
        Polygon((1.5, 16.185606124), (0, 14.685606124), (0, 16.185606124), align=None)
    extrude(amount=F3_T60_DEPTH)

    split(bisect_by=Plane(origin=(-14.7623957799, 0.9210791755, 0), x_dir=(0, 0, 1), z_dir=(0.9980591835, -0.0622725162, 0)), keep=Keep.TOP)


with BuildPart() as f3_tool62:
    # F3_s63 → F3_t64 (new body)
    with BuildSketch(Plane(origin=(1.5880145579, 25.4515572947, 0), x_dir=(0, 0, 1), z_dir=(-0.0622725162, -0.9980591835, 0))):
        Polygon((1.5, 14.7911025961), (0, 13.2911025961), (0, 14.7911025961), align=None)
    extrude(amount=F3_T64_DEPTH)

    split(bisect_by=Plane(origin=(-9.6752745589, 12.9754733174, 0), x_dir=(0, 0, 1), z_dir=(0.5977702957, -0.8016674333, 0)), keep=Keep.TOP)


with BuildPart() as f3_tool58_1:
    add(f3_tool58.part)

    # F3_t66: intersect F3_tool62
    add(f3_tool62.part, mode=Mode.INTERSECT)


with BuildPart() as f1_17:
    add(f1_16.part)

    # F3_t56: cut F3_tool58
    add(f3_tool58_1.part, mode=Mode.SUBTRACT)


with BuildPart() as f3_tool69:
    # F3_s70 → F3_t71 (new body)
    with BuildSketch(Plane(origin=(1.6660218019, -0.7171447999, 0), x_dir=(0, 0, 1), z_dir=(0.9185179783, -0.3953792148, 0))):
        Polygon((1.5, 16.185606124), (0, 14.685606124), (0, 16.185606124), align=None)
    extrude(amount=F3_T71_DEPTH)

    split(bisect_by=Plane(origin=(6.5835199251, -13.2451493538, 0), x_dir=(0, 0, 1), z_dir=(-0.4451000108, 0.8954808655, 0)), keep=Keep.TOP)


with BuildPart() as f3_tool73:
    # F3_s74 → F3_t75 (new body)
    with BuildSketch(Plane(origin=(-22.835702462, -11.3505176986, 0), x_dir=(0, 0, 1), z_dir=(0.8954808655, 0.4451000108, 0))):
        Polygon((1.5, 14.7911025961), (0, 13.2911025961), (0, 14.7911025961), align=None)
    extrude(amount=F3_T75_DEPTH)

    split(bisect_by=Plane(origin=(-6.3994522396, -14.8667702153, 0), x_dir=(0, 0, 1), z_dir=(0.3953792148, 0.9185179783, 0)), keep=Keep.TOP)


with BuildPart() as f3_tool69_1:
    add(f3_tool69.part)

    # F3_t77: intersect F3_tool73
    add(f3_tool73.part, mode=Mode.INTERSECT)


with BuildPart() as f1_18:
    add(f1_17.part)

    # F3_t67: cut F3_tool69
    add(f3_tool69_1.part, mode=Mode.SUBTRACT)


solid = f1_18.part
